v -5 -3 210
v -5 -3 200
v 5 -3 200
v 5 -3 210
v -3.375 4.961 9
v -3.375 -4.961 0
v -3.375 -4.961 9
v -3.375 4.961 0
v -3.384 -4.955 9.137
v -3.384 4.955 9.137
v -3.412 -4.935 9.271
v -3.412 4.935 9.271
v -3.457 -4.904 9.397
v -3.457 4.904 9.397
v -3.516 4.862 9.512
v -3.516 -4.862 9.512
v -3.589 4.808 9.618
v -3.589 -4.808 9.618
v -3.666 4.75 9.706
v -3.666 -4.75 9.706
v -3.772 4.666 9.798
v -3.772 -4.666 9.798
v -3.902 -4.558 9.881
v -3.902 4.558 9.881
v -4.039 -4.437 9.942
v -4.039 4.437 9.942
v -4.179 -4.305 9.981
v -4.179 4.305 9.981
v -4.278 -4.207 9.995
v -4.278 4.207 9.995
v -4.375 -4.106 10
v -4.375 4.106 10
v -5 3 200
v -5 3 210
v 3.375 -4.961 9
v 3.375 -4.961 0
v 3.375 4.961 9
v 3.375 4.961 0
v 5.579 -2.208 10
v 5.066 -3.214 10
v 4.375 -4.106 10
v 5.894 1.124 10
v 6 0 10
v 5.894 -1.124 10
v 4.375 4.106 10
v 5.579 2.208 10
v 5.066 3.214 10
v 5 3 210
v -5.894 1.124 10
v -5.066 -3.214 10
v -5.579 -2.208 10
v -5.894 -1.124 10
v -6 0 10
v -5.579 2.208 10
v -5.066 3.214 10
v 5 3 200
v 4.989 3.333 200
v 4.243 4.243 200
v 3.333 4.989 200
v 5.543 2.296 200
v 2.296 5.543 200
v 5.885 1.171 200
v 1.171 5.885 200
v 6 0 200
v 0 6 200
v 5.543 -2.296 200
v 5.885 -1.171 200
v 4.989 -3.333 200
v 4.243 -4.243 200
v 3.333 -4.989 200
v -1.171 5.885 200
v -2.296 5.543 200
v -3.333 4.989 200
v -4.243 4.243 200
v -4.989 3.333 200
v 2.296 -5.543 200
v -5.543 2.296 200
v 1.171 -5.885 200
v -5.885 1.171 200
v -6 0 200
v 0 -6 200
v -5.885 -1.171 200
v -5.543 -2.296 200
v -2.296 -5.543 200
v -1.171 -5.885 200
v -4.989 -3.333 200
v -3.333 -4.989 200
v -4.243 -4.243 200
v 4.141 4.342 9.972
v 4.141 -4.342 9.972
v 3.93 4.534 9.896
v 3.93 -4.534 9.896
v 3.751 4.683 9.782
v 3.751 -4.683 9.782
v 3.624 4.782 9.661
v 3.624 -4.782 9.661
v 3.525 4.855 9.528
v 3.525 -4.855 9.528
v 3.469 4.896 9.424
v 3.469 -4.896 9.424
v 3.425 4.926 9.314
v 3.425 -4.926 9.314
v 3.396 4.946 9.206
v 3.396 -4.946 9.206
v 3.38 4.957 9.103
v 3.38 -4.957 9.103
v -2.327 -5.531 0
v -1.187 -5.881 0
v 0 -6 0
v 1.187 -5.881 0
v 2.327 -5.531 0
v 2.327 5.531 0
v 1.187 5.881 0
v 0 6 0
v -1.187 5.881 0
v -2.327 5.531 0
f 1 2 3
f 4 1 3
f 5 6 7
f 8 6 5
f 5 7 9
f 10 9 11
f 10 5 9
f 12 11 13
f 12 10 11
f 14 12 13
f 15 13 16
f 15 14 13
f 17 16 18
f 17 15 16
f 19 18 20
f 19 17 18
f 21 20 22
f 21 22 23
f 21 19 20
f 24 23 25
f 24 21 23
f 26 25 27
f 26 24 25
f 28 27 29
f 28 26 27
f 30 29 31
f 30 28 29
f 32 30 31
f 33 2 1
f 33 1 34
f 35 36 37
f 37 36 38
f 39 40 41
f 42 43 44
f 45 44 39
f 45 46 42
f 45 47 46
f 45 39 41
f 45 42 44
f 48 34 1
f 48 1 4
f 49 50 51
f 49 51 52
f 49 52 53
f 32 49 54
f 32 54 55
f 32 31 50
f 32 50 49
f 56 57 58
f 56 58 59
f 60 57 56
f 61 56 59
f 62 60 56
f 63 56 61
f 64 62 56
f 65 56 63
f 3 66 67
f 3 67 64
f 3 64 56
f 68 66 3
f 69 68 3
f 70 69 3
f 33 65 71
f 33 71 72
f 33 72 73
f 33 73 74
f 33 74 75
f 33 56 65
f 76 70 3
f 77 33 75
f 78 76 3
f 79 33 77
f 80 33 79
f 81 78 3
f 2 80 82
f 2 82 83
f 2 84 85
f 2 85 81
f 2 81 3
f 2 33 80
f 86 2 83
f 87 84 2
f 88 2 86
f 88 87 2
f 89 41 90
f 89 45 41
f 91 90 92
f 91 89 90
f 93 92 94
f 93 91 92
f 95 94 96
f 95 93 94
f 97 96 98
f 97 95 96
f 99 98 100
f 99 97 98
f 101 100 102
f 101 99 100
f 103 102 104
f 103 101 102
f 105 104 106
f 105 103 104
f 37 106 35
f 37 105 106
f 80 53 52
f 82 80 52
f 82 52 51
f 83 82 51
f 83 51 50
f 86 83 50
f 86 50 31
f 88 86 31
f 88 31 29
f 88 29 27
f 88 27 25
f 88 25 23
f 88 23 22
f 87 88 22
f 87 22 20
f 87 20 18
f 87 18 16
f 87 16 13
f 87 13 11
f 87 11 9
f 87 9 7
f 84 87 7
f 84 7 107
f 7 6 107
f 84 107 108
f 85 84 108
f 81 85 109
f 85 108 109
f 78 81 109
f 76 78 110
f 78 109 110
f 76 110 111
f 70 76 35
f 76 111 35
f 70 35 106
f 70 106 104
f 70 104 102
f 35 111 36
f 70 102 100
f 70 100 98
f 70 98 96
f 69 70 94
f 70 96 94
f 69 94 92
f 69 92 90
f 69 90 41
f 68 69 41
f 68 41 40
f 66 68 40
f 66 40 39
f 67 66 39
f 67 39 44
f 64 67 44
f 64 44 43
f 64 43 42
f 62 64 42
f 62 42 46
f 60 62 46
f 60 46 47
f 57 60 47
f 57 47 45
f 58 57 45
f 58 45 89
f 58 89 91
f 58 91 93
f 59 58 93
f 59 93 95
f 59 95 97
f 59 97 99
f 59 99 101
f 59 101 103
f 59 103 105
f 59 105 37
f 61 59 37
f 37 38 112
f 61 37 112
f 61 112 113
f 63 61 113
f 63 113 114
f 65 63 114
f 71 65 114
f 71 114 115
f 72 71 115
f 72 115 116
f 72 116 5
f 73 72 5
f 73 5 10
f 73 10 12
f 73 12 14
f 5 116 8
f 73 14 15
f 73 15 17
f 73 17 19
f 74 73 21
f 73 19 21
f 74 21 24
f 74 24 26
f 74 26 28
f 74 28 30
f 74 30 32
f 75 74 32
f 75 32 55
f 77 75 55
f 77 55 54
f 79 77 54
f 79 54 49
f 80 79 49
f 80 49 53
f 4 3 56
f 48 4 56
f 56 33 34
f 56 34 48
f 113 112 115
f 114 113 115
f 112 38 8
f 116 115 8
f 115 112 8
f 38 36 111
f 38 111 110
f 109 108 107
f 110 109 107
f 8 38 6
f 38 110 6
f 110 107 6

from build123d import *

# Parameters (mm, degrees)
SCHIZZO1_R                   = 6
ESTRUSIONE_ESTRUSIONE1_DEPTH = 200
SCHIZZO2_W                   = 10
SCHIZZO2_H                   = 6
ESTRUSIONE_ESTRUSIONE2_DEPTH = 10
SCHIZZO6_W                   = 2.625434249
SCHIZZO6_H                   = 12.677495408
TAGLIO_ESTRUSIONE1_DEPTH     = 10
RACCORDO2_R                  = 1
RACCORDO3_R                  = 1


with BuildPart() as part:
    # Schizzo1 → Estrusione-Estrusione1 (new body)
    with BuildSketch(Plane.XY):
        with Locations(Location((0, 0, 0), (0, 0, 180))):
            Circle(SCHIZZO1_R)
    extrude(amount=ESTRUSIONE_ESTRUSIONE1_DEPTH)

    # Schizzo2 → Estrusione-Estrusione2 (add)
    with BuildSketch(Plane.XY.offset(200)):
        Rectangle(SCHIZZO2_W, SCHIZZO2_H)
    extrude(amount=ESTRUSIONE_ESTRUSIONE2_DEPTH)

    # Schizzo6 → Taglio-Estrusione1 (cut)
    with BuildSketch(Plane(origin=(0, 0, 0), x_dir=(-1, 0, 0), z_dir=(0, 0, -1))):
        with Locations((4.687282876, 0.338747704)):
            Rectangle(SCHIZZO6_W, SCHIZZO6_H)
        with Locations((-4.687282876, 0.338747704)):
            Rectangle(SCHIZZO6_W, SCHIZZO6_H)
    extrude(amount=-TAGLIO_ESTRUSIONE1_DEPTH, mode=Mode.SUBTRACT)

    # Raccordo2
    raccordo2_edges = [part.edges().sort_by_distance(p)[0] for p in [
        (3.374565751, 0, 10),
    ]]
    fillet(raccordo2_edges, radius=RACCORDO2_R)

    # Raccordo3
    raccordo3_edges = [part.edges().sort_by_distance(p)[0] for p in [
        (-3.374565751, 0, 10),
    ]]
    fillet(raccordo3_edges, radius=RACCORDO3_R)


solid = part.part
